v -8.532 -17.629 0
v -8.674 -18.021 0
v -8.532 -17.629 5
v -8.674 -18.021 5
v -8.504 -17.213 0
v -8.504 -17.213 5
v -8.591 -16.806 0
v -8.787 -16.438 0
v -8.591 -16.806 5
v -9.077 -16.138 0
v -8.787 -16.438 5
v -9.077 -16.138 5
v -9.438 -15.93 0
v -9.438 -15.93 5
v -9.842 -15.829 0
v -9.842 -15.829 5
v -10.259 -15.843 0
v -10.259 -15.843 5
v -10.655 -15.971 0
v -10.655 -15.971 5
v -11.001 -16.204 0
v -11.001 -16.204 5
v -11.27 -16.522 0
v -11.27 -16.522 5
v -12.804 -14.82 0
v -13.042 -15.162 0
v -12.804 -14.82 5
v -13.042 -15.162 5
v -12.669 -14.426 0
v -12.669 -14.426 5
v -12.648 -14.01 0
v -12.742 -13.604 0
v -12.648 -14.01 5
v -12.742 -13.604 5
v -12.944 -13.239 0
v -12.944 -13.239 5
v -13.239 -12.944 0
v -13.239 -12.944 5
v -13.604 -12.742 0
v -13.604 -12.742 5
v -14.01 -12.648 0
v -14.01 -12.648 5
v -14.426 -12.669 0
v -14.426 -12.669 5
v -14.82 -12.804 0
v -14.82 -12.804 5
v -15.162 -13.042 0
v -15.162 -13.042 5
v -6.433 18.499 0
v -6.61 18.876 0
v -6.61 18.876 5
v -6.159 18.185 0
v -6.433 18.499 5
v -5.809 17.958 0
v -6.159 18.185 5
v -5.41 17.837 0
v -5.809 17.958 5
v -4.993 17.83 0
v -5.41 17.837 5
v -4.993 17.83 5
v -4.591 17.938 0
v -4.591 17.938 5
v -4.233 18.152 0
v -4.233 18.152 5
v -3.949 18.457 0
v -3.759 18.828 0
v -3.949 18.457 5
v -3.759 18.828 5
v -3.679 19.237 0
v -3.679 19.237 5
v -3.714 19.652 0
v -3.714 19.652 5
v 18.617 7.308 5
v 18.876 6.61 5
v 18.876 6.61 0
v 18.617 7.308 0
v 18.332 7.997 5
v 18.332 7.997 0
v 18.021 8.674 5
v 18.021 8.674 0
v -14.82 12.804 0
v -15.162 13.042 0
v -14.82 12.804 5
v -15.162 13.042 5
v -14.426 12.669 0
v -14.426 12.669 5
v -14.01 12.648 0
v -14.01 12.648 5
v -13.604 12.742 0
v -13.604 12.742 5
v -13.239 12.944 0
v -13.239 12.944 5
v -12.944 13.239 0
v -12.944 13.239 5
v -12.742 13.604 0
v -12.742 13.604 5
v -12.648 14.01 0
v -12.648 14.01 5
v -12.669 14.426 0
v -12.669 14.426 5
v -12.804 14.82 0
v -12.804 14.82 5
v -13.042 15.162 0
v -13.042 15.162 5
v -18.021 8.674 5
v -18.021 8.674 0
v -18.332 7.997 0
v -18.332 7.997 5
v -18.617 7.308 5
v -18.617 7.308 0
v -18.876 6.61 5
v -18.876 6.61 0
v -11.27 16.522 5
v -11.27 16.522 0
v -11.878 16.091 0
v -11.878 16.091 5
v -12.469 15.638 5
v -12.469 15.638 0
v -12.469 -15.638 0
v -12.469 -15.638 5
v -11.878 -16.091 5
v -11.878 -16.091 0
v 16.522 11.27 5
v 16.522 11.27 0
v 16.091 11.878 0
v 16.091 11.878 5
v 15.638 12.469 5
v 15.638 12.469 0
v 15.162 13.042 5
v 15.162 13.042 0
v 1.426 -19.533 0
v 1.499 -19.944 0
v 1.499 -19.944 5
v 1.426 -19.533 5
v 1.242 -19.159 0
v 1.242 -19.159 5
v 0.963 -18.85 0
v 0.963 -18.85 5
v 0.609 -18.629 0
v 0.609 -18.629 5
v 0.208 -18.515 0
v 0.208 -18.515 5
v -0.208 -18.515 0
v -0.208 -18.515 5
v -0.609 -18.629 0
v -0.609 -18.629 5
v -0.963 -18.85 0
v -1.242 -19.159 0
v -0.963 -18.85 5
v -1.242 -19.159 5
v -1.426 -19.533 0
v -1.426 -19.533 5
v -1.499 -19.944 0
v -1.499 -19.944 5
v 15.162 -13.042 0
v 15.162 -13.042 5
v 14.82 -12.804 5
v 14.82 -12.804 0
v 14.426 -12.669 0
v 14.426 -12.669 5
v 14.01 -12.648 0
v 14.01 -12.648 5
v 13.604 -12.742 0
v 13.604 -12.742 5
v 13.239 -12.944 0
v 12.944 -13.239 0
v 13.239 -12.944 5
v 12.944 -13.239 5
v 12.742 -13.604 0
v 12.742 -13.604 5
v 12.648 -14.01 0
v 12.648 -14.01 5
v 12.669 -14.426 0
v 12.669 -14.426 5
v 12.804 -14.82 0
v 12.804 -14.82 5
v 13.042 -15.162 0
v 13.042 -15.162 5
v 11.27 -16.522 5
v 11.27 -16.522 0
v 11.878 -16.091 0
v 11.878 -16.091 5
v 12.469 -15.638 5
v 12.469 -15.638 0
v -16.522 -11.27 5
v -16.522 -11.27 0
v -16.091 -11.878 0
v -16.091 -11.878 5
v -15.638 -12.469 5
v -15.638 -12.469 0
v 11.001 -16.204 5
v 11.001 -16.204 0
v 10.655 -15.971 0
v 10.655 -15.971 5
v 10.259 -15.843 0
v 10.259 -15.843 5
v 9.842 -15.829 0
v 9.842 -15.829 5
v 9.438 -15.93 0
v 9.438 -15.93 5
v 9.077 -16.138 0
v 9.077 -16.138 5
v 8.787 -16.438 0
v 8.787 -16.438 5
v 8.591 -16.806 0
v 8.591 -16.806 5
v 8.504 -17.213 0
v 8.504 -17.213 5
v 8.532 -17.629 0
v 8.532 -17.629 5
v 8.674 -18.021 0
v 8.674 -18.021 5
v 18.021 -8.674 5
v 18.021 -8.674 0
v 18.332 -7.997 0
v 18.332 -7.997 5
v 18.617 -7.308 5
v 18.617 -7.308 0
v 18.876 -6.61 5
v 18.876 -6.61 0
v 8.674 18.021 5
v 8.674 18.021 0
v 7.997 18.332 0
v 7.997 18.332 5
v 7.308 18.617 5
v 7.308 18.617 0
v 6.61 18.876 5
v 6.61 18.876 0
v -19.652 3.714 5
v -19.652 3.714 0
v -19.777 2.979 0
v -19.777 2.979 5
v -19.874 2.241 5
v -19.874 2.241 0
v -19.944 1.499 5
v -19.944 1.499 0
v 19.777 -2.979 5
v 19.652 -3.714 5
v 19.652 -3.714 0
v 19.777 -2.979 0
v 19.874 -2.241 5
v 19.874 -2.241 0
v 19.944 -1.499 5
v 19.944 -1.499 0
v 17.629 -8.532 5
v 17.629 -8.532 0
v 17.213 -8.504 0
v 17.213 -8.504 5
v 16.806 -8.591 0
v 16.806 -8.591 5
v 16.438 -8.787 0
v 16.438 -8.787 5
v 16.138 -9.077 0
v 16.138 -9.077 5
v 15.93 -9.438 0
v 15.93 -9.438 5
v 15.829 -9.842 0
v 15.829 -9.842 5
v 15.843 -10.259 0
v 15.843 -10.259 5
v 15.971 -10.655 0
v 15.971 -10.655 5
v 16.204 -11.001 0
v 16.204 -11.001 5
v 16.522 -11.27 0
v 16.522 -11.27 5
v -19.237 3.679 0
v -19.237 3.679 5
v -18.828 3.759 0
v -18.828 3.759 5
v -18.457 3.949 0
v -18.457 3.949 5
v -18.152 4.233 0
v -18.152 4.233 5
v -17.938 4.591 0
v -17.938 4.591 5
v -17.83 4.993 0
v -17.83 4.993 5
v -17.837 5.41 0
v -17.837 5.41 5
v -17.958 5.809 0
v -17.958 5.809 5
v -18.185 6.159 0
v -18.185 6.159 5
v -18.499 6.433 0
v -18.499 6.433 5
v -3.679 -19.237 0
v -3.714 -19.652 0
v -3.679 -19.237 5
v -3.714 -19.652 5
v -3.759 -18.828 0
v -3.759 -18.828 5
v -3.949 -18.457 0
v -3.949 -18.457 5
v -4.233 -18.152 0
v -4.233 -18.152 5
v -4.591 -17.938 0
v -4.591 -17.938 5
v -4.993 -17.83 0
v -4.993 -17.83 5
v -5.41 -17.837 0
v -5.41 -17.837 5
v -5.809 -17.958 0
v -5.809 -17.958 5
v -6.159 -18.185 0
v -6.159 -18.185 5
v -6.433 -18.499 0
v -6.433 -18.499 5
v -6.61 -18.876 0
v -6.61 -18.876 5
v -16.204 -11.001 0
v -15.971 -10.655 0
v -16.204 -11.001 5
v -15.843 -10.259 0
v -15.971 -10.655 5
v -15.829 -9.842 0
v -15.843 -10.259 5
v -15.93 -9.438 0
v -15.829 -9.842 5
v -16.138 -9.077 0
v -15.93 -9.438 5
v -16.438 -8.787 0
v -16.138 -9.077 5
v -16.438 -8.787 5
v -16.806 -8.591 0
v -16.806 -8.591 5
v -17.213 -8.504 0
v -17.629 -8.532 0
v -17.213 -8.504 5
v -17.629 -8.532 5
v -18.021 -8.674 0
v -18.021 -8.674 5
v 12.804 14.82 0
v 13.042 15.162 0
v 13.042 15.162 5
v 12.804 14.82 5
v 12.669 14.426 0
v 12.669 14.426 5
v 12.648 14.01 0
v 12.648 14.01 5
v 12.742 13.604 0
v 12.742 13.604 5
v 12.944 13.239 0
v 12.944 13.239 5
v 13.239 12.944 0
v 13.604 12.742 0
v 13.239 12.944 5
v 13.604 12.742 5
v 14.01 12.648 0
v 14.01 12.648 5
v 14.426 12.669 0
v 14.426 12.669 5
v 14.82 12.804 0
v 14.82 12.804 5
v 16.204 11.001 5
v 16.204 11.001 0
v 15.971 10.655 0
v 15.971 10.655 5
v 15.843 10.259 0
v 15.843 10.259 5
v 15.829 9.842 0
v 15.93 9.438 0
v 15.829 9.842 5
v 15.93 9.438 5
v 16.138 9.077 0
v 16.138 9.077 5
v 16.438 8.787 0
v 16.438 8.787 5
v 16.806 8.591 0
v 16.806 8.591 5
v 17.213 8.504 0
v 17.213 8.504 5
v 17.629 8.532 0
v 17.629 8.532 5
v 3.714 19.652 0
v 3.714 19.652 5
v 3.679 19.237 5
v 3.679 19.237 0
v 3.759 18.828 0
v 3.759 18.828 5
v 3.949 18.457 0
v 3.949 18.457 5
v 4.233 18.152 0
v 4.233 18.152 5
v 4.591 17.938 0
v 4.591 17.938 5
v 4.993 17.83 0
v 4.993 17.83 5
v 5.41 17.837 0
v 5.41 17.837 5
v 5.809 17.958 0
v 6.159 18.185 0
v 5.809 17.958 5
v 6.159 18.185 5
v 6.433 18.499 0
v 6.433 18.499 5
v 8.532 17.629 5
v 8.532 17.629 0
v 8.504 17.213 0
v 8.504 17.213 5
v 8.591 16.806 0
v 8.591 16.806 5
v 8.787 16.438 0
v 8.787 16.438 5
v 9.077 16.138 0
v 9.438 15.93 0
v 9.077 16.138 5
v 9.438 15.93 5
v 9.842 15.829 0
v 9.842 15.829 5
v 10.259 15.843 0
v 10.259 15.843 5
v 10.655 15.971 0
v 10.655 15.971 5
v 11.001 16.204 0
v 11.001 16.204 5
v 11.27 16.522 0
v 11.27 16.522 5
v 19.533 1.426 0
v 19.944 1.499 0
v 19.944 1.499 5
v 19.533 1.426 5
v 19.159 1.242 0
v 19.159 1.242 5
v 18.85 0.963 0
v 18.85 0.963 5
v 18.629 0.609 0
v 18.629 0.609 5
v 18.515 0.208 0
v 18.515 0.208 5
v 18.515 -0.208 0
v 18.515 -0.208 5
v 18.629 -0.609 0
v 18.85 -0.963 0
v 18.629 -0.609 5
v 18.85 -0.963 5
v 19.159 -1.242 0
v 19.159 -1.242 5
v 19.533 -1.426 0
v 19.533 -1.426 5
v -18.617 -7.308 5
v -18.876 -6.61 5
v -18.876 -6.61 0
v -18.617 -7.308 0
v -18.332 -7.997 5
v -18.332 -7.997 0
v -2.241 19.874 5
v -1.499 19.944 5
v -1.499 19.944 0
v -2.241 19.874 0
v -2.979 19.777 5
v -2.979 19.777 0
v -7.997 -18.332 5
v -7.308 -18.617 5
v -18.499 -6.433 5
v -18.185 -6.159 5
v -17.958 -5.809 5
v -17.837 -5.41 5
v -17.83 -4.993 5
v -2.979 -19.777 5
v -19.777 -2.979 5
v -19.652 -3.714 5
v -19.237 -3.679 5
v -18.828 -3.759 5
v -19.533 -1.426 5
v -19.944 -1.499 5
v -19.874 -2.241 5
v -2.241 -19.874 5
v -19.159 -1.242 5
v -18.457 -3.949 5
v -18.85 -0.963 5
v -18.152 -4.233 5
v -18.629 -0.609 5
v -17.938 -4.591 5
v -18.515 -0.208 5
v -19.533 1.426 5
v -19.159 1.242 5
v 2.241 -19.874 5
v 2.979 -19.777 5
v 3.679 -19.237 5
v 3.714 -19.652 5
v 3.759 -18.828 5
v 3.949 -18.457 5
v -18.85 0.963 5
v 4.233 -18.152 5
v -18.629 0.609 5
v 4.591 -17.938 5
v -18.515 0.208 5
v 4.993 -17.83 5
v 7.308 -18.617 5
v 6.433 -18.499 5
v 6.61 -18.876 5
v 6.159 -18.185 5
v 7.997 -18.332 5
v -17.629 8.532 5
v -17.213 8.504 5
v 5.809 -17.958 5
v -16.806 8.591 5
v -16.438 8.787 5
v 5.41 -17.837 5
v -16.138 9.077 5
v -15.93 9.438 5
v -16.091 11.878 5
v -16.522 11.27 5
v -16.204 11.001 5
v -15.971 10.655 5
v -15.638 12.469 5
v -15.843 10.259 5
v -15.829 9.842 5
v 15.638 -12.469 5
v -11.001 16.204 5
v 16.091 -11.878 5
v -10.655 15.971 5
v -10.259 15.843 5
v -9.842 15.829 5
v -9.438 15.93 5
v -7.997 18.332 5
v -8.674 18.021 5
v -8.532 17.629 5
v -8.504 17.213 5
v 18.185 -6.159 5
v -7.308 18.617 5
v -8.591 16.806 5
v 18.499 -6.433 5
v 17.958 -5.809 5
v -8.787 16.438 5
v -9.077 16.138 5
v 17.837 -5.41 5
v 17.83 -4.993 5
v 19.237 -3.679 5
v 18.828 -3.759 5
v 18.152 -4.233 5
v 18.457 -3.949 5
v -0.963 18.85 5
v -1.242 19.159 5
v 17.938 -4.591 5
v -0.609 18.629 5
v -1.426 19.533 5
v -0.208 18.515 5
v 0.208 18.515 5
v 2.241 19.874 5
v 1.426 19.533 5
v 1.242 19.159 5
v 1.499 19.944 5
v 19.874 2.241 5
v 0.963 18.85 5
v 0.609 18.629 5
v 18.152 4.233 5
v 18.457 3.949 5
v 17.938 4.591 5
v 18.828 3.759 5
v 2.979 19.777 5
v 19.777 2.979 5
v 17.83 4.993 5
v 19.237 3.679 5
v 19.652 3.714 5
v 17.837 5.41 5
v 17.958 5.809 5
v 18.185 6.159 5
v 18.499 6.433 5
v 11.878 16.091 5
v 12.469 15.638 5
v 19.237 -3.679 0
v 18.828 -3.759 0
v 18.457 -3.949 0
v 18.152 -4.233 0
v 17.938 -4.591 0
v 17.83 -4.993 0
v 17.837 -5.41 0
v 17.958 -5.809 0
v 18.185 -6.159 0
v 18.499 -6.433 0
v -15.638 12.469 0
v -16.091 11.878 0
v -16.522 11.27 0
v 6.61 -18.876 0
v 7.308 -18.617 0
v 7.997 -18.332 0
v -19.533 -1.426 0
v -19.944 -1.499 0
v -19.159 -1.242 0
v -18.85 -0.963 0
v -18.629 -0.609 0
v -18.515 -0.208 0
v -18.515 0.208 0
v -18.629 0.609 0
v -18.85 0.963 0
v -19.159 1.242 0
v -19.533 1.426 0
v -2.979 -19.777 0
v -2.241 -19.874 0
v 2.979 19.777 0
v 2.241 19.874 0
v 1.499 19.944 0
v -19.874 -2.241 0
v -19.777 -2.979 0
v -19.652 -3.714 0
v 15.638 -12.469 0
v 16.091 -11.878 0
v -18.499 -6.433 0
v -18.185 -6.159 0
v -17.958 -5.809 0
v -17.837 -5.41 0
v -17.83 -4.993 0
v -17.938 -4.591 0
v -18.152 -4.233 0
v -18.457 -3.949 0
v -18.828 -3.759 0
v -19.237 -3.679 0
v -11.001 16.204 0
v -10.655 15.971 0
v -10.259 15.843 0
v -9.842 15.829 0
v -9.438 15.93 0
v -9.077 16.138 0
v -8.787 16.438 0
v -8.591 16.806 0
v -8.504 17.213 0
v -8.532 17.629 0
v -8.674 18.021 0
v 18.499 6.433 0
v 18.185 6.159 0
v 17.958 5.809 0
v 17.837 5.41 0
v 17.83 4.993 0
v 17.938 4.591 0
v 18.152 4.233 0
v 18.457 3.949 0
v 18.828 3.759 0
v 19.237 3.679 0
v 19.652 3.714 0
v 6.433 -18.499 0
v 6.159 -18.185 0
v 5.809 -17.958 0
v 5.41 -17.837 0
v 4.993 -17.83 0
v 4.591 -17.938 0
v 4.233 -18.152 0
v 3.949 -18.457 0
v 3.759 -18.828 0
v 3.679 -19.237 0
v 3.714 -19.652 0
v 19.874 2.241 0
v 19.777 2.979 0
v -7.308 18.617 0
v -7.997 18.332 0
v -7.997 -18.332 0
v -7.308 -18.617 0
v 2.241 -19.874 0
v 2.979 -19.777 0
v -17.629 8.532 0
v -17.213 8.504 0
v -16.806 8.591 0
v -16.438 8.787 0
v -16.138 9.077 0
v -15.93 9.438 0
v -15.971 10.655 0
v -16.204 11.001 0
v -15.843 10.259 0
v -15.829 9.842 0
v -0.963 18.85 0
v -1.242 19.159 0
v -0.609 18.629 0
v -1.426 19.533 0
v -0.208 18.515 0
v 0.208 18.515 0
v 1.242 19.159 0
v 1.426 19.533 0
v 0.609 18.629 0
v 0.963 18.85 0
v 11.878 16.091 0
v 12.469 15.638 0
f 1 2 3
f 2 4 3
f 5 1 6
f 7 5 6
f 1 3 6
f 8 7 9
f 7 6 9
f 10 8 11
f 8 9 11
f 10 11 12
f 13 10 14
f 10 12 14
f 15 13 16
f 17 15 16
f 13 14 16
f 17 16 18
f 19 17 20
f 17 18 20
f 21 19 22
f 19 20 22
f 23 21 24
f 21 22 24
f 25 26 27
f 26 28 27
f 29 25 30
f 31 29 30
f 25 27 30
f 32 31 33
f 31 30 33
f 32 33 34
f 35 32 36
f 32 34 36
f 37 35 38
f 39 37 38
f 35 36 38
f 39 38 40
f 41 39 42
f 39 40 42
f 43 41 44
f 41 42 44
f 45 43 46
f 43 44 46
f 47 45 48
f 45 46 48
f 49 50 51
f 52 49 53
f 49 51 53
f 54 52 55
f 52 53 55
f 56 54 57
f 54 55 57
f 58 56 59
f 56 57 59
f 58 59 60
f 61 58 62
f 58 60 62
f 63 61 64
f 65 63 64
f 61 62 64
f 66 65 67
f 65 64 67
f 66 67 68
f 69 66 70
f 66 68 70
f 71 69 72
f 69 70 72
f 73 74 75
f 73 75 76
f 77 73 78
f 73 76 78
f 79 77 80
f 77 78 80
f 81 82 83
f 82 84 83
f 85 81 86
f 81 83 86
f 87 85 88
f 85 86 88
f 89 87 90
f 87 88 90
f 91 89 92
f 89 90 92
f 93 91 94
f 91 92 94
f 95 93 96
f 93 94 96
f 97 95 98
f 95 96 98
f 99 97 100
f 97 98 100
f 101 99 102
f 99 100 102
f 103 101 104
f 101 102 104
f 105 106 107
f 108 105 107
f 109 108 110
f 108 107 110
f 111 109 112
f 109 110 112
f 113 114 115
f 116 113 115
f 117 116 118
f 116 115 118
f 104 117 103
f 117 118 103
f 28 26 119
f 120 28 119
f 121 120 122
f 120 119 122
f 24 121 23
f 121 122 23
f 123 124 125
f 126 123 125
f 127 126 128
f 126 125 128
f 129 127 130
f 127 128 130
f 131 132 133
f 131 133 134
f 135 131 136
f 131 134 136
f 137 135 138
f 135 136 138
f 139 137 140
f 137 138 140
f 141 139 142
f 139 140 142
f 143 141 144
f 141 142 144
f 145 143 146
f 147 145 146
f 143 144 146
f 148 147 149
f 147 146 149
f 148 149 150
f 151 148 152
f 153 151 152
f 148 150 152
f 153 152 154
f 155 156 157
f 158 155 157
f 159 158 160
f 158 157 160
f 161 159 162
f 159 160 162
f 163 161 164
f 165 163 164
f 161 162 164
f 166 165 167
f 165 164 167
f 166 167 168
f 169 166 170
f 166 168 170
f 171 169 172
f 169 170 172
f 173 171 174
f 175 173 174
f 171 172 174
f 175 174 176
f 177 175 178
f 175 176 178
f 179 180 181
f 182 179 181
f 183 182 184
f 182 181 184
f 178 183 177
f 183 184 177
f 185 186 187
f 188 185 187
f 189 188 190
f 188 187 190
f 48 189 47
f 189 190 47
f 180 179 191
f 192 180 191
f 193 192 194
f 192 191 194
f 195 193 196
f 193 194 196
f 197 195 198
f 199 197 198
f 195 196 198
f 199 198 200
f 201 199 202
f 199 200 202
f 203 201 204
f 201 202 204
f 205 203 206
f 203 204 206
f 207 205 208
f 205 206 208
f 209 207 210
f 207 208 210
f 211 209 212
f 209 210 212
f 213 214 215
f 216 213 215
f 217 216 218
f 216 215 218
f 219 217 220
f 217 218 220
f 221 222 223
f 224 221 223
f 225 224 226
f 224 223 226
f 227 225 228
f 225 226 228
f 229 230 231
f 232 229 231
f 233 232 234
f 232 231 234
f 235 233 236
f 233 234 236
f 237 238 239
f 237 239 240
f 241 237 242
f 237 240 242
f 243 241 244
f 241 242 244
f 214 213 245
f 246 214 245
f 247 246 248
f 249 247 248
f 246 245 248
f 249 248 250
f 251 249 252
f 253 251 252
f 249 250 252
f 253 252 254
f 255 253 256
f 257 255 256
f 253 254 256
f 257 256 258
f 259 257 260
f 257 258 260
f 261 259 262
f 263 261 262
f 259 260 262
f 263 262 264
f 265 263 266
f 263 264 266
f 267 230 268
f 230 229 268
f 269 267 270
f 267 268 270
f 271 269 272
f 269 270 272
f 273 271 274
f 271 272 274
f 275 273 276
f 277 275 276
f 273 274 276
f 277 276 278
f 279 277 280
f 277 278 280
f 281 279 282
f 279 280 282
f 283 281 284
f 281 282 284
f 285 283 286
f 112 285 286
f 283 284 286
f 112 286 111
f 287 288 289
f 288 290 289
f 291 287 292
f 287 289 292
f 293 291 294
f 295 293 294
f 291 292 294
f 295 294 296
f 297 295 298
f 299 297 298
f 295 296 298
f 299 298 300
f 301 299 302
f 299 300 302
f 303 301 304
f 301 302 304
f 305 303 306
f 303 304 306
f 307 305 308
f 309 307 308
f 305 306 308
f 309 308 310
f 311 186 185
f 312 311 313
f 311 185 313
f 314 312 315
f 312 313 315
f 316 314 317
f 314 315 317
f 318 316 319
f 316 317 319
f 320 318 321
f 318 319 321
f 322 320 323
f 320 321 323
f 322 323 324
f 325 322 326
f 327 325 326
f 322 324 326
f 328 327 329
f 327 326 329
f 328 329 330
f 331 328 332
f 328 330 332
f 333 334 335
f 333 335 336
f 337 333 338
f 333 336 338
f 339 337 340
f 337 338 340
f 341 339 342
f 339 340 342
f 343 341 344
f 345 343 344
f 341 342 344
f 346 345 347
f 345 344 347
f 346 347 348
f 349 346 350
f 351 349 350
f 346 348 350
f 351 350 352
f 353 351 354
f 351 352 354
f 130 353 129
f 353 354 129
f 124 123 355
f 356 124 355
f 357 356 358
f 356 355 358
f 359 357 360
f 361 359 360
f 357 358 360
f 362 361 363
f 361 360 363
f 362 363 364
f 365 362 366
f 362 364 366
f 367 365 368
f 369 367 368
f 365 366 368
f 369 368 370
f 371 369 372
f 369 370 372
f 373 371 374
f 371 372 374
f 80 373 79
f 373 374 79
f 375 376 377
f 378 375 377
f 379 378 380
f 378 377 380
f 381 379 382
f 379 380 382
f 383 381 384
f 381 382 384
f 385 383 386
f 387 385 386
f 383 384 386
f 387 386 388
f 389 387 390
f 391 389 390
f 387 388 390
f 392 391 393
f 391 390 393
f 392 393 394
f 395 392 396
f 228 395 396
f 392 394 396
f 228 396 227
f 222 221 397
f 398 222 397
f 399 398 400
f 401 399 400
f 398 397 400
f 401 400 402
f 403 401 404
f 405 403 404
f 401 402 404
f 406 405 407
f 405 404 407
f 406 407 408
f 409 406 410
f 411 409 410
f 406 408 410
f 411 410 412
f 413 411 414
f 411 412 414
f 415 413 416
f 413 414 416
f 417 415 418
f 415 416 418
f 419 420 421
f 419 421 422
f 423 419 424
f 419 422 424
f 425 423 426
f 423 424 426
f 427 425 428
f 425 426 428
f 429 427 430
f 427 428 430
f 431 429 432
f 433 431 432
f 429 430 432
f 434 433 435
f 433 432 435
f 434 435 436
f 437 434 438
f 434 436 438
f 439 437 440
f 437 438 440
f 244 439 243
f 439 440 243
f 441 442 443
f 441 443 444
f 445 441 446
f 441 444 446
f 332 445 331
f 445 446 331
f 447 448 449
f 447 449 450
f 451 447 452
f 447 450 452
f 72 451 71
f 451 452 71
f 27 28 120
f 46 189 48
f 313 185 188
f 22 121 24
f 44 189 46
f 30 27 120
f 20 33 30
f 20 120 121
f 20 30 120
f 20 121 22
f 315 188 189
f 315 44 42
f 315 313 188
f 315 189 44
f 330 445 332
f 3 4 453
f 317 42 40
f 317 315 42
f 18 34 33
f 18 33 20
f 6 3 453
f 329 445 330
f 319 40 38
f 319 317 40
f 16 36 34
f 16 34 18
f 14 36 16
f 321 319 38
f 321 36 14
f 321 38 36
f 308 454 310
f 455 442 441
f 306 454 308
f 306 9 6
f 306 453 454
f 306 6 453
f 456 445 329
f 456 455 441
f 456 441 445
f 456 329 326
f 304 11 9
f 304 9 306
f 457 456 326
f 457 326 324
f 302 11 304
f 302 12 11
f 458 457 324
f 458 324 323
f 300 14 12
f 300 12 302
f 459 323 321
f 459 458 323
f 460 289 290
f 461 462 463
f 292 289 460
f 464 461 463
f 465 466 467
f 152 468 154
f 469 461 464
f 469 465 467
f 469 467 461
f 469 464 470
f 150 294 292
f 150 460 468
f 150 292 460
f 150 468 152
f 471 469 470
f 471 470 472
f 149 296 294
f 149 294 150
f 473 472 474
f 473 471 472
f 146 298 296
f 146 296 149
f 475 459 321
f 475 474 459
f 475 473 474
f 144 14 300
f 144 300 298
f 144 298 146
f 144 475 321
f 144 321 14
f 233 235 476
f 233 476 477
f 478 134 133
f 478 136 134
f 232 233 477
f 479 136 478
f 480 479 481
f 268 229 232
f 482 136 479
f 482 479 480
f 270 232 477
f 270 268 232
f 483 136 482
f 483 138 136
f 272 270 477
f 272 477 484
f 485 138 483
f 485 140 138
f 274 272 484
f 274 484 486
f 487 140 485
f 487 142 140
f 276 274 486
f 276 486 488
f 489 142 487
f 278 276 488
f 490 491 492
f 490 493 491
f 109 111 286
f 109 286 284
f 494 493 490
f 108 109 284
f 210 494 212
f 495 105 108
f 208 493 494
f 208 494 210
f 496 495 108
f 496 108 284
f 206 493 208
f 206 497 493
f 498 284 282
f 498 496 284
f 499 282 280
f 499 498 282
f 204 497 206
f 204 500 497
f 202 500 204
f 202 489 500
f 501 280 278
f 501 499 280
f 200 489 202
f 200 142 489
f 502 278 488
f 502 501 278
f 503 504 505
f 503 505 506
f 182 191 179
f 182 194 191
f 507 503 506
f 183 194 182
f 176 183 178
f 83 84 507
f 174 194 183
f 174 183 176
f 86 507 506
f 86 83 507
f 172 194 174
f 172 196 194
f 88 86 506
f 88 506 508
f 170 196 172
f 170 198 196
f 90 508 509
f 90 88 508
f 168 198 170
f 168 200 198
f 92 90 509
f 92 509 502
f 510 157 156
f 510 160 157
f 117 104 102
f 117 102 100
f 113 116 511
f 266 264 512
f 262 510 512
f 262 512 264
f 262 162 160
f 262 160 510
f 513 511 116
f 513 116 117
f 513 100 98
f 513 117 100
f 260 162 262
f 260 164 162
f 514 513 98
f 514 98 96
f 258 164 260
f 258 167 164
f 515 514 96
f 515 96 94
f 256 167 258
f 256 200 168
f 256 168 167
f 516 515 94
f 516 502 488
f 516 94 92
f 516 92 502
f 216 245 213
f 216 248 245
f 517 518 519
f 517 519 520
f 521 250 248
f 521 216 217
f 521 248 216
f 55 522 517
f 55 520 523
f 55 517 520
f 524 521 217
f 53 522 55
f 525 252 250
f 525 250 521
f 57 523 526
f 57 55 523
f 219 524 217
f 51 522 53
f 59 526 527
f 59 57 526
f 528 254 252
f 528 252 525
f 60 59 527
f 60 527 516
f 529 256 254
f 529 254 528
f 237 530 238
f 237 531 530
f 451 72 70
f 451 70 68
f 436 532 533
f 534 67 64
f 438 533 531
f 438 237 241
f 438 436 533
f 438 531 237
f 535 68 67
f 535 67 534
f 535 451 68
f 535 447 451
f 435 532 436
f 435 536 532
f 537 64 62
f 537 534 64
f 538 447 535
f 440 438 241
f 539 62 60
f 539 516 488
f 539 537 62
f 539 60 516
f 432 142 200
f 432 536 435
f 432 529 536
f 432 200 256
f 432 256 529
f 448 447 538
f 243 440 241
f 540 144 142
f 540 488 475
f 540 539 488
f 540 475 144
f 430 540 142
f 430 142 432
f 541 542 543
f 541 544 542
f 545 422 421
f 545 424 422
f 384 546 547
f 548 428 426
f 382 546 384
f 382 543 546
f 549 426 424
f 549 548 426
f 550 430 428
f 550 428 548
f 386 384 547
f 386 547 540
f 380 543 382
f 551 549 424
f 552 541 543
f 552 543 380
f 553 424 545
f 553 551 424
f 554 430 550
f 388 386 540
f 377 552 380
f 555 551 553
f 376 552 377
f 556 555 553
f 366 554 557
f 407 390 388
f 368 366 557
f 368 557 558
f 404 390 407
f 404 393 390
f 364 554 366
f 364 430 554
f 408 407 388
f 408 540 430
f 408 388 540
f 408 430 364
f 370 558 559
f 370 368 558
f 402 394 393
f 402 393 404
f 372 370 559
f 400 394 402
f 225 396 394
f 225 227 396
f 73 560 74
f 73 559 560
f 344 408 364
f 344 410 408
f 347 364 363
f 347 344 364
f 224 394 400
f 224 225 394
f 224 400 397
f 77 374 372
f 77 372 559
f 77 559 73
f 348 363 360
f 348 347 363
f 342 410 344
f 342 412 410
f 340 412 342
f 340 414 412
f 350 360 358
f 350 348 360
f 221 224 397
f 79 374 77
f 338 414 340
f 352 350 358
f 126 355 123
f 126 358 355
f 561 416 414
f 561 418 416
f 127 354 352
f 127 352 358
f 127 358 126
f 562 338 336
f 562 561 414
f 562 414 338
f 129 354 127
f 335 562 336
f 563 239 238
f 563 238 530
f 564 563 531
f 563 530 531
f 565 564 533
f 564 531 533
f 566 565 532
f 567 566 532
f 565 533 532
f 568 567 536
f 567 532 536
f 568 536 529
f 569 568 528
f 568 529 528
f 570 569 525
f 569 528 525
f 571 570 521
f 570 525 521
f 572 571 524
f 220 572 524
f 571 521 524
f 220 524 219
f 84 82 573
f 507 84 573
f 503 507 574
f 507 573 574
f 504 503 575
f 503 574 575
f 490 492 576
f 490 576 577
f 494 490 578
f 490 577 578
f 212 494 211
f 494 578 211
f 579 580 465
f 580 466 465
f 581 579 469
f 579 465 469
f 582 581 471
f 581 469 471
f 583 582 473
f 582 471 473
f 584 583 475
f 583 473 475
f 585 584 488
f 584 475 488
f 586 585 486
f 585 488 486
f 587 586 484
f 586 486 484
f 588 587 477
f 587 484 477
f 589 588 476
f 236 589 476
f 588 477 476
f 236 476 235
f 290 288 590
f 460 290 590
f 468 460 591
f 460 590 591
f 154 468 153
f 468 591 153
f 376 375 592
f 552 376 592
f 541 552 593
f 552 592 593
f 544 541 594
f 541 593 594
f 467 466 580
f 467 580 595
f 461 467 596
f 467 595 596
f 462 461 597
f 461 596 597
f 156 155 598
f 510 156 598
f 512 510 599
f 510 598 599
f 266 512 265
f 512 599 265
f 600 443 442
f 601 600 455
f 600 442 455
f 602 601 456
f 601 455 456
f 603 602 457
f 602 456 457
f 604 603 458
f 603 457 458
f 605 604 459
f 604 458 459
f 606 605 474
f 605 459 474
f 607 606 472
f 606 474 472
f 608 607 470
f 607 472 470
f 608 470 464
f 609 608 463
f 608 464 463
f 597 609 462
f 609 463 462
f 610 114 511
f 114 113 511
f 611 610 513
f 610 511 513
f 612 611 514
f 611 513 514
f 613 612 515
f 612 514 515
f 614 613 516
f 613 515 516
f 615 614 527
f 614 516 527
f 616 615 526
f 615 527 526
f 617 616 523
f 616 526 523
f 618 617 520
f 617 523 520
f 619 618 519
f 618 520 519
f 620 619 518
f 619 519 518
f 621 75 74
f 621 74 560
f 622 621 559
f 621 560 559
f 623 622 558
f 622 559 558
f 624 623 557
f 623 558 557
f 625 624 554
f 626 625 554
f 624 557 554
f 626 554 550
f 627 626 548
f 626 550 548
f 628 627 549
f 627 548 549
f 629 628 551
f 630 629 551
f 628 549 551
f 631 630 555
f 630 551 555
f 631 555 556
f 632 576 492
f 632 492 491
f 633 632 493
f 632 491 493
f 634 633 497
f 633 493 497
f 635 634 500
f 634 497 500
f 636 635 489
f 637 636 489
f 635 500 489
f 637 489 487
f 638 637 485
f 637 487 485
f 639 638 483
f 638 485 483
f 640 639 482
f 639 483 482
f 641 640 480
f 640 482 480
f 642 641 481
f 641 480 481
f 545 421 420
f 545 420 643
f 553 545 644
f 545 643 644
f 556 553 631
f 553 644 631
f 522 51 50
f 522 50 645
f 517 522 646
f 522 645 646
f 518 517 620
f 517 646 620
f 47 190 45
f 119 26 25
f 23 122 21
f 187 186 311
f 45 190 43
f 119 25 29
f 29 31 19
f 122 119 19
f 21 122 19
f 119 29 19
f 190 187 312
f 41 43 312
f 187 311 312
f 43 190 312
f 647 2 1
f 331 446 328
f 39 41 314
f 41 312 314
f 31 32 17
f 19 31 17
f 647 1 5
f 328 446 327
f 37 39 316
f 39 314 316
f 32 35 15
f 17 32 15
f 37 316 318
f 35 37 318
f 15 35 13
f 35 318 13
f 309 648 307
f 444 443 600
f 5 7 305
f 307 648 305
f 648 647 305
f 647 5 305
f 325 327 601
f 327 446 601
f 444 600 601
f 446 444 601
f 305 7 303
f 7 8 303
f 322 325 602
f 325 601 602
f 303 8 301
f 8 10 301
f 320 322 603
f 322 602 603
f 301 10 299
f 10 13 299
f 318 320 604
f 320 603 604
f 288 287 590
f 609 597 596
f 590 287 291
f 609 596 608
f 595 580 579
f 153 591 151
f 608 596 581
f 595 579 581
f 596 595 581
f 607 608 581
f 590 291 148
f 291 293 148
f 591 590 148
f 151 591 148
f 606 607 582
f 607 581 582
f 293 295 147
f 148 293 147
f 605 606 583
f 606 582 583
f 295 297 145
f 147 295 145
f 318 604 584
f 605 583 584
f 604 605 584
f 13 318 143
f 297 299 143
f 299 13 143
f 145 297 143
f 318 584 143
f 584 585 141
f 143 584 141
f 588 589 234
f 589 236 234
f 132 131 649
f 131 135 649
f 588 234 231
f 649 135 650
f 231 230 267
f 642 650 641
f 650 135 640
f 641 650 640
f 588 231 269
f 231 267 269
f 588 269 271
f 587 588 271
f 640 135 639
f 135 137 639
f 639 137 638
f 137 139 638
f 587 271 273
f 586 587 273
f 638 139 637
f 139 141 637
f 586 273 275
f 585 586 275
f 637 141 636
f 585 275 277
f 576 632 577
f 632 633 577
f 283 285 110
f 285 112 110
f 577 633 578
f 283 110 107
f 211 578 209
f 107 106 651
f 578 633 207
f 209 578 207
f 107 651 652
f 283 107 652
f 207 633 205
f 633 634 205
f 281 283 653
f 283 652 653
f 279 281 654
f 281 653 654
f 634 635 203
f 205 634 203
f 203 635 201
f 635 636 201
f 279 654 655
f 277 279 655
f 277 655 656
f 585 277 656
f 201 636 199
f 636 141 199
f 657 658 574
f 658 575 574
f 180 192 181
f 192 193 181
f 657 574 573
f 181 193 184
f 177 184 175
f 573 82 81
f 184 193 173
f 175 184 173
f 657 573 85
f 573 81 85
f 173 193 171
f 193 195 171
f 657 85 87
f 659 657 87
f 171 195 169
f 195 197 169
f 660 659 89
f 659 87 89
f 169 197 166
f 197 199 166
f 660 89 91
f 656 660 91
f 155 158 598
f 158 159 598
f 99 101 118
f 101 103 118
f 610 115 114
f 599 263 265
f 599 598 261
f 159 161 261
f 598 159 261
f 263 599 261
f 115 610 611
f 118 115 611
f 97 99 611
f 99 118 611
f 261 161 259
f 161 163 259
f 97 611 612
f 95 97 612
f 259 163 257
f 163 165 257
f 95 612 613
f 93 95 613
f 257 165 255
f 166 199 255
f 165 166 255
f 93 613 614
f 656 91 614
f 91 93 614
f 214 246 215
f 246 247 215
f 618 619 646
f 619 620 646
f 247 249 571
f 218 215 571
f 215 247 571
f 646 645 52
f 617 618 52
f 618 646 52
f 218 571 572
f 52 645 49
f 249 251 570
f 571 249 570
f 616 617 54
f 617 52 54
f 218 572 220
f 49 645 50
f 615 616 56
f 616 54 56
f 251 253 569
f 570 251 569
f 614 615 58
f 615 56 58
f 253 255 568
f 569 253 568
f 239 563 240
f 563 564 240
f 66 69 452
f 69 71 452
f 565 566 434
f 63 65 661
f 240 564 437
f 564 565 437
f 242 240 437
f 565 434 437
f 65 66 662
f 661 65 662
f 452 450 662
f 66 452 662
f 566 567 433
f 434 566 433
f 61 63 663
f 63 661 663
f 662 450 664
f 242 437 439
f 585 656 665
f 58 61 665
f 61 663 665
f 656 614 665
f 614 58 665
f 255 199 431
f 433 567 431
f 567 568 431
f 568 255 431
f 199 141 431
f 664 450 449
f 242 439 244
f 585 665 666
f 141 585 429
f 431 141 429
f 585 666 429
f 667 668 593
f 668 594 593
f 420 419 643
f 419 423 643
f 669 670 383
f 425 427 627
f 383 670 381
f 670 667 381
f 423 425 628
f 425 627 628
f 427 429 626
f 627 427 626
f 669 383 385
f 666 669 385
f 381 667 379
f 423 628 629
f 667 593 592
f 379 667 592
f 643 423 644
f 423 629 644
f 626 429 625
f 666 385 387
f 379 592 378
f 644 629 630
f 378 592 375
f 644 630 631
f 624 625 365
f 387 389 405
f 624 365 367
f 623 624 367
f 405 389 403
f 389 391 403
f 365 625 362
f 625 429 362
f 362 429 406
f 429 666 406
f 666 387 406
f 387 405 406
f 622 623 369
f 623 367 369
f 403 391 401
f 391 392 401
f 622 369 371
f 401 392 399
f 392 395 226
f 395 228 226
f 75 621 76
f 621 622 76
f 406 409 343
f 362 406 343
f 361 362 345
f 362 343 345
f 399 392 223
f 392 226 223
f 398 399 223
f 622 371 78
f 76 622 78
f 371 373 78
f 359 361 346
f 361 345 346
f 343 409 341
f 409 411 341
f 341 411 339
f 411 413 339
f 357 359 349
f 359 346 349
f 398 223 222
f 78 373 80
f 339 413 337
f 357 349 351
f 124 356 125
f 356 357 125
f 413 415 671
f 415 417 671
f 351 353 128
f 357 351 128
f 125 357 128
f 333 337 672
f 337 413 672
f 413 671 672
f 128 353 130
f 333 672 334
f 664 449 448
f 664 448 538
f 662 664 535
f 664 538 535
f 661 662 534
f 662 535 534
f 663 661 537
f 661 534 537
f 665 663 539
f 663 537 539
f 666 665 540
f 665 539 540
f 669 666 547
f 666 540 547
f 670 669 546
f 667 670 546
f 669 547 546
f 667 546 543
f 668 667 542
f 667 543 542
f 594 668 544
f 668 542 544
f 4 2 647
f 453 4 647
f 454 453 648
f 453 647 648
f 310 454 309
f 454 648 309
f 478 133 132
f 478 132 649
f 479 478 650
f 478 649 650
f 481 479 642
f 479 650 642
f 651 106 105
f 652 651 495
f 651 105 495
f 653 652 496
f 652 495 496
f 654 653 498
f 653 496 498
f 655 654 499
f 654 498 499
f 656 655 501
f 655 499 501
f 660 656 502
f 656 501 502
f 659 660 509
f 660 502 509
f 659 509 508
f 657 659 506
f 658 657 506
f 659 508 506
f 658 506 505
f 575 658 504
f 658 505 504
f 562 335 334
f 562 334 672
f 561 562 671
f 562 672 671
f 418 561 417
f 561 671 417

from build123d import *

# Parameters (mm, degrees)
SKETCH1_R           = 20
BOSS_EXTRUDE1_DEPTH = 5
SKETCH3_R           = 1.5
CUT_EXTRUDE1_DEPTH  = 5


with BuildPart() as part:
    # Sketch1 → Boss-Extrude1 (new body)
    with BuildSketch(Plane.XY):
        Circle(SKETCH1_R)
    extrude(amount=BOSS_EXTRUDE1_DEPTH)

    # Sketch3 → Cut-Extrude1 (cut)
    with BuildSketch(Plane.XY.offset(5)):
        with Locations((0, 20)):
            Circle(SKETCH3_R)
        with Locations((5.176380902, 19.318516526)):
            Circle(SKETCH3_R)
        with Locations((10, 17.320508076)):
            Circle(SKETCH3_R)
        with Locations((14.142135624, 14.142135624)):
            Circle(SKETCH3_R)
        with Locations((17.320508076, 10)):
            Circle(SKETCH3_R)
        with Locations((19.318516526, 5.176380902)):
            Circle(SKETCH3_R)
        with Locations((20, 0)):
            Circle(SKETCH3_R)
        with Locations((19.318516526, -5.176380902)):
            Circle(SKETCH3_R)
        with Locations((17.320508076, -10)):
            Circle(SKETCH3_R)
        with Locations((14.142135624, -14.142135624)):
            Circle(SKETCH3_R)
        with Locations((10, -17.320508076)):
            Circle(SKETCH3_R)
        with Locations((5.176380902, -19.318516526)):
            Circle(SKETCH3_R)
        with Locations((0, -20)):
            Circle(SKETCH3_R)
        with Locations((-5.176380902, -19.318516526)):
            Circle(SKETCH3_R)
        with Locations((-10, -17.320508076)):
            Circle(SKETCH3_R)
        with Locations((-14.142135624, -14.142135624)):
            Circle(SKETCH3_R)
        with Locations((-17.320508076, -10)):
            Circle(SKETCH3_R)
        with Locations((-19.318516526, -5.176380902)):
            Circle(SKETCH3_R)
        with Locations((-20, 0)):
            Circle(SKETCH3_R)
        with Locations((-19.318516526, 5.176380902)):
            Circle(SKETCH3_R)
        with Locations((-17.320508076, 10)):
            Circle(SKETCH3_R)
        with Locations((-14.142135624, 14.142135624)):
            Circle(SKETCH3_R)
        with Locations((-10, 17.320508076)):
            Circle(SKETCH3_R)
        with Locations((-5.176380902, 19.318516526)):
            Circle(SKETCH3_R)
    extrude(amount=-CUT_EXTRUDE1_DEPTH, mode=Mode.SUBTRACT)


solid = part.part
